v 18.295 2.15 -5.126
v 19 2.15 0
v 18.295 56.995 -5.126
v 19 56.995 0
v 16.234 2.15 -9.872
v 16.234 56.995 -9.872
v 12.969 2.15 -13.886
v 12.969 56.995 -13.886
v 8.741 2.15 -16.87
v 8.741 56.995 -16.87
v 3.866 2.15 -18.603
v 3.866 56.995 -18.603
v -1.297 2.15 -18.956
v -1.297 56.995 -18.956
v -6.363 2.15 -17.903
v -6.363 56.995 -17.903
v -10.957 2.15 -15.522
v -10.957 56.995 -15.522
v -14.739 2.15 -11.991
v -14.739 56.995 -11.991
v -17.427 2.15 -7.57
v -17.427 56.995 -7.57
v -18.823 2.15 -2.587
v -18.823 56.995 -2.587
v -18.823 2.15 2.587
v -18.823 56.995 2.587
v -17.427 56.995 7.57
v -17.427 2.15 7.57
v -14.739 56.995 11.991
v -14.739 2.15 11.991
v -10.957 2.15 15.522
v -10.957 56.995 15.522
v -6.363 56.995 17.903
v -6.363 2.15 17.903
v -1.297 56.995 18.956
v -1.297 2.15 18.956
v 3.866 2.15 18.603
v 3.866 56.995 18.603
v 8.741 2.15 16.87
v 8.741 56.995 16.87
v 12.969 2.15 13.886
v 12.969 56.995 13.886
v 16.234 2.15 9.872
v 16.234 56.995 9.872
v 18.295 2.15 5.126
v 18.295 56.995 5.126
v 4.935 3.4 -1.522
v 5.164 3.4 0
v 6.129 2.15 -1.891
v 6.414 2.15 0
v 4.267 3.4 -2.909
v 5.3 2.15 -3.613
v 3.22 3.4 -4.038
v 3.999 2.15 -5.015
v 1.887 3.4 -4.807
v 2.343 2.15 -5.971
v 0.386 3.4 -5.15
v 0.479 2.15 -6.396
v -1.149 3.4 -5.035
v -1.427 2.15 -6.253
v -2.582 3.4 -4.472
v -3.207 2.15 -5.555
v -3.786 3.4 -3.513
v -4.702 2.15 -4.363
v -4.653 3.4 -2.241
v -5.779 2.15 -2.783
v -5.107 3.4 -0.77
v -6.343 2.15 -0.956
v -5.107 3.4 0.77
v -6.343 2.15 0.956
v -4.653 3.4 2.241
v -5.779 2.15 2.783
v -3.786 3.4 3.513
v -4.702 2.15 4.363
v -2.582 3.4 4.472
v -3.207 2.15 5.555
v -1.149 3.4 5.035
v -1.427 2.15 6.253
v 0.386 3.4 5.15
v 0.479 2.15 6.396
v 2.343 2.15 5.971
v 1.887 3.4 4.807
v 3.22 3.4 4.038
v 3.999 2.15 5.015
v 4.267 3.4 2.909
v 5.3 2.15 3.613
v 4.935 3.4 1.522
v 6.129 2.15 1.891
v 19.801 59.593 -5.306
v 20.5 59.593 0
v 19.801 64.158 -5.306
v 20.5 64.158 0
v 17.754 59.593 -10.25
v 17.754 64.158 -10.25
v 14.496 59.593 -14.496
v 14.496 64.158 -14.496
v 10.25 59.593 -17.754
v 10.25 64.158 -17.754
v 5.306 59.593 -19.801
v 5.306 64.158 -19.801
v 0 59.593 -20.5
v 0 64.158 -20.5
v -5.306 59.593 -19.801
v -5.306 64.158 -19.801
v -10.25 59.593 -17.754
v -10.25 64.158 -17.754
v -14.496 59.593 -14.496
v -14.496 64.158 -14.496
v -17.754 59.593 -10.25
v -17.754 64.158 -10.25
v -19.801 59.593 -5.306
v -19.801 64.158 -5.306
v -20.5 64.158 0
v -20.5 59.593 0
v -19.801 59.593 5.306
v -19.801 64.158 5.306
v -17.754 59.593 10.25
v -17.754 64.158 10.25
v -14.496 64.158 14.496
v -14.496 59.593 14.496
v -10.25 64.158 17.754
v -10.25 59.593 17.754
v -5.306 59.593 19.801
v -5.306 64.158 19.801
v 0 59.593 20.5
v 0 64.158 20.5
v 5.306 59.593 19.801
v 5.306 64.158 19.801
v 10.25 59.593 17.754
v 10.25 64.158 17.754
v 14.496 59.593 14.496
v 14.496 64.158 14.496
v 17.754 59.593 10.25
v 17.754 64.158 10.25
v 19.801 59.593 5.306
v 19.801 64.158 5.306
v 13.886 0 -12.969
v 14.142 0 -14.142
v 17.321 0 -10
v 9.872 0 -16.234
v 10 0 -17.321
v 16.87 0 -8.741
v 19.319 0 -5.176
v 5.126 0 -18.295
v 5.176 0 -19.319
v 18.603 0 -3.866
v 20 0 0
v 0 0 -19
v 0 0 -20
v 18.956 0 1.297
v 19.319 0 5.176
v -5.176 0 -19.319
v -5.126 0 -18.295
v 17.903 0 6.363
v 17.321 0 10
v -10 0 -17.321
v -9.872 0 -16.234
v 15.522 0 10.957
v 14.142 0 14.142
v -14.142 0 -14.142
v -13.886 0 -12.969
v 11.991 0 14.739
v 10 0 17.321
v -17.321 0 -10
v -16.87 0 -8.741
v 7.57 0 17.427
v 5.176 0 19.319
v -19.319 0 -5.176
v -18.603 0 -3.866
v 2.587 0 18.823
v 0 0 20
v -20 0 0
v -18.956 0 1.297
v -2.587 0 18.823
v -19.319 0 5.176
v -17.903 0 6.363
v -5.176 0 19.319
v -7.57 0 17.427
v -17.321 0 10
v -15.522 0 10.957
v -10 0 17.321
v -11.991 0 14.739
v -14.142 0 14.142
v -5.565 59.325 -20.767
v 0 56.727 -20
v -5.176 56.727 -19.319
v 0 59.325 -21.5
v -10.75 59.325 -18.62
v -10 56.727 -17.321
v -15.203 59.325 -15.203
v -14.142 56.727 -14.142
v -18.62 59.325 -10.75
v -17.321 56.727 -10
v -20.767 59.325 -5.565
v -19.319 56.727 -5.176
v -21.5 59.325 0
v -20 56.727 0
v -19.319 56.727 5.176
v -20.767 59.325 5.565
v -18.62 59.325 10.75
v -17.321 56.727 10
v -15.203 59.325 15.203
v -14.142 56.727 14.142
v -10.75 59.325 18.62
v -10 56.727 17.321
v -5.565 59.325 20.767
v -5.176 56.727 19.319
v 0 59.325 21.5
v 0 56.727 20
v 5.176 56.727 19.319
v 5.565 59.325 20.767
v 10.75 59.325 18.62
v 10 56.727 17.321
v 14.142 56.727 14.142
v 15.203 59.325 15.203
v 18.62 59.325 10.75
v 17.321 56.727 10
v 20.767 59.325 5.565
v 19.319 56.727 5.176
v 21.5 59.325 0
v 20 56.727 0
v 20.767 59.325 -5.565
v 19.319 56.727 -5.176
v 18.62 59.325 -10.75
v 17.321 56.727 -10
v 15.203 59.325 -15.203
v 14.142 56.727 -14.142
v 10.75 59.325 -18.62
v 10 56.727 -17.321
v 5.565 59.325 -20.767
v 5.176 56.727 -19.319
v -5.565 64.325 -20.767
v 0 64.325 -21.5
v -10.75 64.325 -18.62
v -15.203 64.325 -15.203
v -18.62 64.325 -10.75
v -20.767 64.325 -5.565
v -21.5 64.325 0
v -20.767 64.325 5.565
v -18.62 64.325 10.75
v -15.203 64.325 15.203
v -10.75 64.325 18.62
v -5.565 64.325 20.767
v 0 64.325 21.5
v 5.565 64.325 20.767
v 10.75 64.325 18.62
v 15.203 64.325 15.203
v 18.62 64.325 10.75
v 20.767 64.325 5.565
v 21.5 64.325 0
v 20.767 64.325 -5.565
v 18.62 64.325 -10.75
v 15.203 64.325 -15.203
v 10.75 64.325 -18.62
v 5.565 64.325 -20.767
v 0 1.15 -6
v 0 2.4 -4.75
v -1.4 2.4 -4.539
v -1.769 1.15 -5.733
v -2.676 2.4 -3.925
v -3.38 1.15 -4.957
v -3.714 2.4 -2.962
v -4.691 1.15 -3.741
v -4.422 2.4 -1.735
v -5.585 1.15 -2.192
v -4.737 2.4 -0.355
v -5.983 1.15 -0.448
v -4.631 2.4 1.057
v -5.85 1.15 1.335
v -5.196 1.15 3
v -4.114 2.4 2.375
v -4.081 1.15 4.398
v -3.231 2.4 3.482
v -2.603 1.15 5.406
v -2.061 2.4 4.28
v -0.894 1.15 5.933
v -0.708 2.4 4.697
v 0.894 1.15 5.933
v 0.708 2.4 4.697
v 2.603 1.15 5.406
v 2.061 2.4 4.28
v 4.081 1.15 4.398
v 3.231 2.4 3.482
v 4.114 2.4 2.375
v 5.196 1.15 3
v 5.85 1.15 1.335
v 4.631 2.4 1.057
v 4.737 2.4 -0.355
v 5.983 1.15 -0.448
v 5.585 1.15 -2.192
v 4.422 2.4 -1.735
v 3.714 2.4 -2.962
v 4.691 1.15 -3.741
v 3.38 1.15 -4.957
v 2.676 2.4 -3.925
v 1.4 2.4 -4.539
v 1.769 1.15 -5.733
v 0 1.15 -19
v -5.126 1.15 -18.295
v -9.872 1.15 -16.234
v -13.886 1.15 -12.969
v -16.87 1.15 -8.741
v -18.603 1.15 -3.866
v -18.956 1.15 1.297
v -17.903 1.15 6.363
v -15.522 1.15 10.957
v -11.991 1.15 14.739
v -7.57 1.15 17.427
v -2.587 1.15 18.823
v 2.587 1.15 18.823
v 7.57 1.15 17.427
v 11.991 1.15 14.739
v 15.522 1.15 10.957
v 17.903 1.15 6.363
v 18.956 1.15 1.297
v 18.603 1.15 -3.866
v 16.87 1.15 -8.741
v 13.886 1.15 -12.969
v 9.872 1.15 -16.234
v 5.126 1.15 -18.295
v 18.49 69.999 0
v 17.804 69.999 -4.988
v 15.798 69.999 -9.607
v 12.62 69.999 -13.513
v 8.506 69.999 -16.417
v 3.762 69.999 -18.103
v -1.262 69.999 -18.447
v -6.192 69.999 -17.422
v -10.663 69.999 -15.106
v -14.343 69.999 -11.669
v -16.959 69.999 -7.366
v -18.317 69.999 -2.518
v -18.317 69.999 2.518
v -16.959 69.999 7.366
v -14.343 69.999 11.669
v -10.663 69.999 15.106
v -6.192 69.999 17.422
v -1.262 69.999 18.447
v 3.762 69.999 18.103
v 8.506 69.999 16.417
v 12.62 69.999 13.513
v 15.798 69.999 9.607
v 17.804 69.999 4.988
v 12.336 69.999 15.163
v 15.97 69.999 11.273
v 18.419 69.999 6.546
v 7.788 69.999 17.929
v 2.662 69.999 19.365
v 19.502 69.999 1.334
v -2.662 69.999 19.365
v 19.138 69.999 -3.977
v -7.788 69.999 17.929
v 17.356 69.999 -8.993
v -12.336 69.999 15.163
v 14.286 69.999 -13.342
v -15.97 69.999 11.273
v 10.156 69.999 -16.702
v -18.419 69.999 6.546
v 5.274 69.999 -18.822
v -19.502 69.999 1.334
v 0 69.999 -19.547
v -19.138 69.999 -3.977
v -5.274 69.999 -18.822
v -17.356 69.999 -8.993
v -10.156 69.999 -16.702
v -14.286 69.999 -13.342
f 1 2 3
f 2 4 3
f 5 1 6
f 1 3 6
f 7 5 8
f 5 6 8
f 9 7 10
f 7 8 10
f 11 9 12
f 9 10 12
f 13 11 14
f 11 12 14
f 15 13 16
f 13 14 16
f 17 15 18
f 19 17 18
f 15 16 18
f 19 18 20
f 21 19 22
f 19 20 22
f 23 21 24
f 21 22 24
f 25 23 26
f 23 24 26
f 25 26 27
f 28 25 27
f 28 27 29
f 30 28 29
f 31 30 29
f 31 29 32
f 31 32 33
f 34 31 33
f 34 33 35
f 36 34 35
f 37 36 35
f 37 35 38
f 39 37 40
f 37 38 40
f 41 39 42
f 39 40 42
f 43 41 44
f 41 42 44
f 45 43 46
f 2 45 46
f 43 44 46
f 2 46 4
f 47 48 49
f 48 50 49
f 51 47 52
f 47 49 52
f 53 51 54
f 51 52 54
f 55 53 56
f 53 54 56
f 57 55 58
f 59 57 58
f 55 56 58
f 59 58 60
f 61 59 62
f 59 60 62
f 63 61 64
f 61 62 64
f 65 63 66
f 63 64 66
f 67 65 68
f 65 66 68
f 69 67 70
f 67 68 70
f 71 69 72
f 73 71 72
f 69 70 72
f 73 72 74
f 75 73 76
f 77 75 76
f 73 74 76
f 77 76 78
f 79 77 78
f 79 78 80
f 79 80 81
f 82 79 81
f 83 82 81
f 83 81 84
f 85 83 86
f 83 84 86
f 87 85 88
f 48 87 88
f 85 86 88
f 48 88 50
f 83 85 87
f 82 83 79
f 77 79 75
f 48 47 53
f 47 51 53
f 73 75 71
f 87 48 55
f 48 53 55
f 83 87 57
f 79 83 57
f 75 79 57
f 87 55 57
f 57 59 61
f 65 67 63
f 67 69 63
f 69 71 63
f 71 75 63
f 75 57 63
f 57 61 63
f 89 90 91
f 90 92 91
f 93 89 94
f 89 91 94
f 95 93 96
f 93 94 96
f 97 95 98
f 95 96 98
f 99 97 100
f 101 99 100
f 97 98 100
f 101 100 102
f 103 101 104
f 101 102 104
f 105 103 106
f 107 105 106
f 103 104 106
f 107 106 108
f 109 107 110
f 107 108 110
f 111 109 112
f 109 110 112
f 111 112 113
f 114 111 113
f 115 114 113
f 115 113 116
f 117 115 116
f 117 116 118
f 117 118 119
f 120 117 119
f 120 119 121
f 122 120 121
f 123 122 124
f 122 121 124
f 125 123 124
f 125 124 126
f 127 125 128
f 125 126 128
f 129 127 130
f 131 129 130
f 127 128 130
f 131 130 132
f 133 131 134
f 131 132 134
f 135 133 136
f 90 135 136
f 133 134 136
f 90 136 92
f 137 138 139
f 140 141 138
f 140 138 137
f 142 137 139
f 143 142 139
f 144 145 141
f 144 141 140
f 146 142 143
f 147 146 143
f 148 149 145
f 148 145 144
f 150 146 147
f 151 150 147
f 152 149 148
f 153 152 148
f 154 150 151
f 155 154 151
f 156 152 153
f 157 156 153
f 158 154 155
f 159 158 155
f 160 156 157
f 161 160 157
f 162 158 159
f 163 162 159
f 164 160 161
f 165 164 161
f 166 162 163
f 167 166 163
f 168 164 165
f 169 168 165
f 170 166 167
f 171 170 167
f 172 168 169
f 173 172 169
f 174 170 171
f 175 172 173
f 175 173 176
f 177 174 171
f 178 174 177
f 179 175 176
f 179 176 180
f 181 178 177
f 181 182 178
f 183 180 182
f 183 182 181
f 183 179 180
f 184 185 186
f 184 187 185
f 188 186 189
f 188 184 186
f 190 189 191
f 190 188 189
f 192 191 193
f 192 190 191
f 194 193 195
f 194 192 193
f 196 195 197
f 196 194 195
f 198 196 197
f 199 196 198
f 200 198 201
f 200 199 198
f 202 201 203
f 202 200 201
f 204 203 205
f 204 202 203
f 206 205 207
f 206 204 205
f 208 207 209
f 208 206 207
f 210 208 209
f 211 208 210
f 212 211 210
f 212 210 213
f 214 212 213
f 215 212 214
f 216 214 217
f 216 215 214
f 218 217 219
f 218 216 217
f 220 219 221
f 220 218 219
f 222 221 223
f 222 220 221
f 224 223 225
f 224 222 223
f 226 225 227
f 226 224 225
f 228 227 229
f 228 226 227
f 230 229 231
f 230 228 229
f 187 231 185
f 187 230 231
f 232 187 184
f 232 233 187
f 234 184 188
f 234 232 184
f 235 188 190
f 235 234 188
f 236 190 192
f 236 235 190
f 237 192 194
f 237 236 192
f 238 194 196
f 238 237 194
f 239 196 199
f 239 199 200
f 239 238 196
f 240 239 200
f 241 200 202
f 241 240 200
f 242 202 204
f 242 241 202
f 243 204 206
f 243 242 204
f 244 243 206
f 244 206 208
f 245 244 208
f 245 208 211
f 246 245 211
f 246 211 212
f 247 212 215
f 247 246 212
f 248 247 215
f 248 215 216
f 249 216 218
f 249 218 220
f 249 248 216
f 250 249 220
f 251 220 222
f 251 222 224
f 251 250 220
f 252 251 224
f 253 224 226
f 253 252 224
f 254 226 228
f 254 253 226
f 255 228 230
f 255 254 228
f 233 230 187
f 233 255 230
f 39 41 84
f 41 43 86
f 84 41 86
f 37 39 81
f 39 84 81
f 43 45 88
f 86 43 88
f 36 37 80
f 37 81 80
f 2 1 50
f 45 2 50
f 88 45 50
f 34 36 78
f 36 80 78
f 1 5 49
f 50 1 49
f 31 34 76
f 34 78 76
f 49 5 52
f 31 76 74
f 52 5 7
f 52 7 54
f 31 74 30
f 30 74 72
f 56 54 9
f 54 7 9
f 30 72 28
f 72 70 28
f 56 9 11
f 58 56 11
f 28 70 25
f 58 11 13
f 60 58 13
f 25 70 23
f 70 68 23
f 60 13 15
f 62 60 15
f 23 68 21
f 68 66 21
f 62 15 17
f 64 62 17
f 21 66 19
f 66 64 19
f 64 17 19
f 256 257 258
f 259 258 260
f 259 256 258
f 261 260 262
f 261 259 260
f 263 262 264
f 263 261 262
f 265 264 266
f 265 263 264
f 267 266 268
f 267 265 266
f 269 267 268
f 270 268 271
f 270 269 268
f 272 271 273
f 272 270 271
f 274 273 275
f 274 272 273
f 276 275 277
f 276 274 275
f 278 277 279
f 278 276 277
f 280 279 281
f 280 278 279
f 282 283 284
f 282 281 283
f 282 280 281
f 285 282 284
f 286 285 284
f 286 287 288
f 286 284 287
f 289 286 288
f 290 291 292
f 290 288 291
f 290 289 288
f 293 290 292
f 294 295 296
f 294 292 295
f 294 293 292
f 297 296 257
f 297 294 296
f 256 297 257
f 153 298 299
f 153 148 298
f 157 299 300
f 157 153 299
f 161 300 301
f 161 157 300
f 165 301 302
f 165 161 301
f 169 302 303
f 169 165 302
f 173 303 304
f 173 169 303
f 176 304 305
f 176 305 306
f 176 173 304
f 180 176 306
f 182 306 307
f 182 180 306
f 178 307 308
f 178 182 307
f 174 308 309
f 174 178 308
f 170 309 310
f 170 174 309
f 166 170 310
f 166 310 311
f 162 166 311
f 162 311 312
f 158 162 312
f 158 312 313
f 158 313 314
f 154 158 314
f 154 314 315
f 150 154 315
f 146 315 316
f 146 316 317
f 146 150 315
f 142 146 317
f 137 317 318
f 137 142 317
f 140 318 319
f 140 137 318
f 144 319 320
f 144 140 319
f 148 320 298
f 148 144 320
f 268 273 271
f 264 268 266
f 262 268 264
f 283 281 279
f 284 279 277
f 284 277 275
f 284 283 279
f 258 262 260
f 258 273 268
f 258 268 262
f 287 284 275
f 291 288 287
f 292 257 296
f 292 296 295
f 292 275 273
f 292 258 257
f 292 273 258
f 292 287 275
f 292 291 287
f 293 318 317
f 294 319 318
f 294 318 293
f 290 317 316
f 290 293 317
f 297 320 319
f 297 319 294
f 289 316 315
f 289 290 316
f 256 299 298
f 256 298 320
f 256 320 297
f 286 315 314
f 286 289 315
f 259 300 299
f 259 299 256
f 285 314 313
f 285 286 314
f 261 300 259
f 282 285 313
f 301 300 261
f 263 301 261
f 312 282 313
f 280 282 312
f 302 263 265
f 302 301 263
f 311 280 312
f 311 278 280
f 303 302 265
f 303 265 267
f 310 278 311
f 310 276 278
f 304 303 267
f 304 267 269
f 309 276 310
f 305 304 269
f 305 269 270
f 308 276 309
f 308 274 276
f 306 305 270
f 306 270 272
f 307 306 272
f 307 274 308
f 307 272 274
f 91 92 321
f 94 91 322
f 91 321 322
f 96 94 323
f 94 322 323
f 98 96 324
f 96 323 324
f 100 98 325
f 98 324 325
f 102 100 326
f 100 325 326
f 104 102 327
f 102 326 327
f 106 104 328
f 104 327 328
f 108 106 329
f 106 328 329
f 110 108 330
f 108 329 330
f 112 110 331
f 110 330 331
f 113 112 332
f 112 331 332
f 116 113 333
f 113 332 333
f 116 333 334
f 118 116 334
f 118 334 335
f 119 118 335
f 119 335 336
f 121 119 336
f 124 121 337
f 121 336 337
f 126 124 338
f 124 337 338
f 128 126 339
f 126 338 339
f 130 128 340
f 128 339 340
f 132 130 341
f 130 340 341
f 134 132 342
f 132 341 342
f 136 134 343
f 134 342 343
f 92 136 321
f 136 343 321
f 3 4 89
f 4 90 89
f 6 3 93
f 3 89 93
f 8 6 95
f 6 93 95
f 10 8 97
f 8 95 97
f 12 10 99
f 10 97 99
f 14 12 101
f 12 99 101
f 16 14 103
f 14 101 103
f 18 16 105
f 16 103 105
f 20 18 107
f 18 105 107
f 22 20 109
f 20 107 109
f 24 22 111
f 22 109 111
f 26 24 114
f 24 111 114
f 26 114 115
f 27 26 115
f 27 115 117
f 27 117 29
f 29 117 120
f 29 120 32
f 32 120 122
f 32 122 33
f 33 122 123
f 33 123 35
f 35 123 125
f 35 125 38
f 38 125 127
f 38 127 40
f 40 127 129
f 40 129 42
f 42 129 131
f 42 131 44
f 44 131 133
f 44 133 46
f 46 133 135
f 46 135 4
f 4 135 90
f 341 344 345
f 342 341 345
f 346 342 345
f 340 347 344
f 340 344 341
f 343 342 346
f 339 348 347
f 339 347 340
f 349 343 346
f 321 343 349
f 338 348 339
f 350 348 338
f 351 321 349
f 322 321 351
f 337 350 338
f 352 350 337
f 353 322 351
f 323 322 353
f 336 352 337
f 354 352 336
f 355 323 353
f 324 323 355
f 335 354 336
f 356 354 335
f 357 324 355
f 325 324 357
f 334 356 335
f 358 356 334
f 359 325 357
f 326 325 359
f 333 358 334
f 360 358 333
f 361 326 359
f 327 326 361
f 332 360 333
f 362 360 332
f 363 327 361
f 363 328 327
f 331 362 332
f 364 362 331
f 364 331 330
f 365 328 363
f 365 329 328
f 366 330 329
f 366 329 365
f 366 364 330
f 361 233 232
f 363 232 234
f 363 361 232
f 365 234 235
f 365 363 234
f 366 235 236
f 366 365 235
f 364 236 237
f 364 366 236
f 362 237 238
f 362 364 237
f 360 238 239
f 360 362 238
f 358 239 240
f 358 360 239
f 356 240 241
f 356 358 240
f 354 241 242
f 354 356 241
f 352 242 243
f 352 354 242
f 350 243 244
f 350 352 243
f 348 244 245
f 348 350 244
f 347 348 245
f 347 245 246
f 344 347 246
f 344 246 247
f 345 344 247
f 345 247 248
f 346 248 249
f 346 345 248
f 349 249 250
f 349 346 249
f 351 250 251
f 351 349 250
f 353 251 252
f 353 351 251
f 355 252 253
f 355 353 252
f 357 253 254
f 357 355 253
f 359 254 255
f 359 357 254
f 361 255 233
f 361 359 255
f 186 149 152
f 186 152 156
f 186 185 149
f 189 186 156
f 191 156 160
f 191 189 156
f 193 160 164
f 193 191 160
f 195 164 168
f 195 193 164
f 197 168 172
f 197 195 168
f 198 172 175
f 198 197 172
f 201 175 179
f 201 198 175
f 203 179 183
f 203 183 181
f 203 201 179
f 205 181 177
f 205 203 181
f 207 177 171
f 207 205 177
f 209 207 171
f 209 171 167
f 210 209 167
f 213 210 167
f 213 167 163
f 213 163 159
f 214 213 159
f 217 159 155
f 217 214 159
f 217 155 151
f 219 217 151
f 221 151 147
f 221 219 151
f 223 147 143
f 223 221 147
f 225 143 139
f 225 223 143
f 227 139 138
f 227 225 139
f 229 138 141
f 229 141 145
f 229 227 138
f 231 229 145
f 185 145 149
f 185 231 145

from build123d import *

# Parameters (mm, degrees)
FILLET1_SIZE = 1.5


# Read off the part's stored shape, not the designer's step: Shell1
with BuildPart() as part:
    # Sketch1 → Revolve1 (revolve)
    with BuildSketch(Plane.XY, mode=Mode.PRIVATE) as revolve1_sk:
        Polygon((20, 0), (20, 56.727116956), (21.5, 59.325193167), (21.5, 64.325193167), (19.547262907, 69.998535907), (0, 69.998535907), (0, 2.4), (4.5, 2.4), (4.5, 1.15), (19, 1.15), (19, 0), align=None)
    revolve(revolve1_sk.sketch.rotate(Axis((0, 2.4, 0), (0, 1, 0)), 90), axis=Axis((0, 2.4, 0), (0, 1, 0)))

    # Fillet1
    # the kernel refuses this chamfer: 1.5 mm, written as the material it takes off along each edge
    with BuildSketch(Plane(origin=(0, 1.15, 0), x_dir=(0, 0, -1), z_dir=(1, 0, 0))) as fillet1_piece_1_section:
        Polygon((4.5, FILLET1_SIZE), (4.5 + FILLET1_SIZE, 0), (4.5, 0), align=None)
    fillet1_piece_1 = revolve(axis=Axis((0, 1.15, 0), (0, 1, 0)), mode=Mode.PRIVATE)
    fillet1_piece_1 = split(fillet1_piece_1, bisect_by=Plane(origin=(0, 2.4, 5.37255081), z_dir=(0, -1, 0)), keep=Keep.TOP, mode=Mode.PRIVATE)
    add(fillet1_piece_1, mode=Mode.SUBTRACT)

    # Shell1 outline → Shell1 (revolve, cut)
    with BuildSketch(Plane.XY):
        Polygon((18.489685342, 69.998535907), (0, 69.998535907), (0, 3.4), (5.164213562, 3.4), (6.414213562, 2.15), (19, 2.15), (19, 56.995066148), (20.5, 59.59314236), (20.5, 64.157911426), align=None)
    revolve(axis=Axis((0, 0, 0), (0, 1, 0)), mode=Mode.SUBTRACT)


solid = part.part
